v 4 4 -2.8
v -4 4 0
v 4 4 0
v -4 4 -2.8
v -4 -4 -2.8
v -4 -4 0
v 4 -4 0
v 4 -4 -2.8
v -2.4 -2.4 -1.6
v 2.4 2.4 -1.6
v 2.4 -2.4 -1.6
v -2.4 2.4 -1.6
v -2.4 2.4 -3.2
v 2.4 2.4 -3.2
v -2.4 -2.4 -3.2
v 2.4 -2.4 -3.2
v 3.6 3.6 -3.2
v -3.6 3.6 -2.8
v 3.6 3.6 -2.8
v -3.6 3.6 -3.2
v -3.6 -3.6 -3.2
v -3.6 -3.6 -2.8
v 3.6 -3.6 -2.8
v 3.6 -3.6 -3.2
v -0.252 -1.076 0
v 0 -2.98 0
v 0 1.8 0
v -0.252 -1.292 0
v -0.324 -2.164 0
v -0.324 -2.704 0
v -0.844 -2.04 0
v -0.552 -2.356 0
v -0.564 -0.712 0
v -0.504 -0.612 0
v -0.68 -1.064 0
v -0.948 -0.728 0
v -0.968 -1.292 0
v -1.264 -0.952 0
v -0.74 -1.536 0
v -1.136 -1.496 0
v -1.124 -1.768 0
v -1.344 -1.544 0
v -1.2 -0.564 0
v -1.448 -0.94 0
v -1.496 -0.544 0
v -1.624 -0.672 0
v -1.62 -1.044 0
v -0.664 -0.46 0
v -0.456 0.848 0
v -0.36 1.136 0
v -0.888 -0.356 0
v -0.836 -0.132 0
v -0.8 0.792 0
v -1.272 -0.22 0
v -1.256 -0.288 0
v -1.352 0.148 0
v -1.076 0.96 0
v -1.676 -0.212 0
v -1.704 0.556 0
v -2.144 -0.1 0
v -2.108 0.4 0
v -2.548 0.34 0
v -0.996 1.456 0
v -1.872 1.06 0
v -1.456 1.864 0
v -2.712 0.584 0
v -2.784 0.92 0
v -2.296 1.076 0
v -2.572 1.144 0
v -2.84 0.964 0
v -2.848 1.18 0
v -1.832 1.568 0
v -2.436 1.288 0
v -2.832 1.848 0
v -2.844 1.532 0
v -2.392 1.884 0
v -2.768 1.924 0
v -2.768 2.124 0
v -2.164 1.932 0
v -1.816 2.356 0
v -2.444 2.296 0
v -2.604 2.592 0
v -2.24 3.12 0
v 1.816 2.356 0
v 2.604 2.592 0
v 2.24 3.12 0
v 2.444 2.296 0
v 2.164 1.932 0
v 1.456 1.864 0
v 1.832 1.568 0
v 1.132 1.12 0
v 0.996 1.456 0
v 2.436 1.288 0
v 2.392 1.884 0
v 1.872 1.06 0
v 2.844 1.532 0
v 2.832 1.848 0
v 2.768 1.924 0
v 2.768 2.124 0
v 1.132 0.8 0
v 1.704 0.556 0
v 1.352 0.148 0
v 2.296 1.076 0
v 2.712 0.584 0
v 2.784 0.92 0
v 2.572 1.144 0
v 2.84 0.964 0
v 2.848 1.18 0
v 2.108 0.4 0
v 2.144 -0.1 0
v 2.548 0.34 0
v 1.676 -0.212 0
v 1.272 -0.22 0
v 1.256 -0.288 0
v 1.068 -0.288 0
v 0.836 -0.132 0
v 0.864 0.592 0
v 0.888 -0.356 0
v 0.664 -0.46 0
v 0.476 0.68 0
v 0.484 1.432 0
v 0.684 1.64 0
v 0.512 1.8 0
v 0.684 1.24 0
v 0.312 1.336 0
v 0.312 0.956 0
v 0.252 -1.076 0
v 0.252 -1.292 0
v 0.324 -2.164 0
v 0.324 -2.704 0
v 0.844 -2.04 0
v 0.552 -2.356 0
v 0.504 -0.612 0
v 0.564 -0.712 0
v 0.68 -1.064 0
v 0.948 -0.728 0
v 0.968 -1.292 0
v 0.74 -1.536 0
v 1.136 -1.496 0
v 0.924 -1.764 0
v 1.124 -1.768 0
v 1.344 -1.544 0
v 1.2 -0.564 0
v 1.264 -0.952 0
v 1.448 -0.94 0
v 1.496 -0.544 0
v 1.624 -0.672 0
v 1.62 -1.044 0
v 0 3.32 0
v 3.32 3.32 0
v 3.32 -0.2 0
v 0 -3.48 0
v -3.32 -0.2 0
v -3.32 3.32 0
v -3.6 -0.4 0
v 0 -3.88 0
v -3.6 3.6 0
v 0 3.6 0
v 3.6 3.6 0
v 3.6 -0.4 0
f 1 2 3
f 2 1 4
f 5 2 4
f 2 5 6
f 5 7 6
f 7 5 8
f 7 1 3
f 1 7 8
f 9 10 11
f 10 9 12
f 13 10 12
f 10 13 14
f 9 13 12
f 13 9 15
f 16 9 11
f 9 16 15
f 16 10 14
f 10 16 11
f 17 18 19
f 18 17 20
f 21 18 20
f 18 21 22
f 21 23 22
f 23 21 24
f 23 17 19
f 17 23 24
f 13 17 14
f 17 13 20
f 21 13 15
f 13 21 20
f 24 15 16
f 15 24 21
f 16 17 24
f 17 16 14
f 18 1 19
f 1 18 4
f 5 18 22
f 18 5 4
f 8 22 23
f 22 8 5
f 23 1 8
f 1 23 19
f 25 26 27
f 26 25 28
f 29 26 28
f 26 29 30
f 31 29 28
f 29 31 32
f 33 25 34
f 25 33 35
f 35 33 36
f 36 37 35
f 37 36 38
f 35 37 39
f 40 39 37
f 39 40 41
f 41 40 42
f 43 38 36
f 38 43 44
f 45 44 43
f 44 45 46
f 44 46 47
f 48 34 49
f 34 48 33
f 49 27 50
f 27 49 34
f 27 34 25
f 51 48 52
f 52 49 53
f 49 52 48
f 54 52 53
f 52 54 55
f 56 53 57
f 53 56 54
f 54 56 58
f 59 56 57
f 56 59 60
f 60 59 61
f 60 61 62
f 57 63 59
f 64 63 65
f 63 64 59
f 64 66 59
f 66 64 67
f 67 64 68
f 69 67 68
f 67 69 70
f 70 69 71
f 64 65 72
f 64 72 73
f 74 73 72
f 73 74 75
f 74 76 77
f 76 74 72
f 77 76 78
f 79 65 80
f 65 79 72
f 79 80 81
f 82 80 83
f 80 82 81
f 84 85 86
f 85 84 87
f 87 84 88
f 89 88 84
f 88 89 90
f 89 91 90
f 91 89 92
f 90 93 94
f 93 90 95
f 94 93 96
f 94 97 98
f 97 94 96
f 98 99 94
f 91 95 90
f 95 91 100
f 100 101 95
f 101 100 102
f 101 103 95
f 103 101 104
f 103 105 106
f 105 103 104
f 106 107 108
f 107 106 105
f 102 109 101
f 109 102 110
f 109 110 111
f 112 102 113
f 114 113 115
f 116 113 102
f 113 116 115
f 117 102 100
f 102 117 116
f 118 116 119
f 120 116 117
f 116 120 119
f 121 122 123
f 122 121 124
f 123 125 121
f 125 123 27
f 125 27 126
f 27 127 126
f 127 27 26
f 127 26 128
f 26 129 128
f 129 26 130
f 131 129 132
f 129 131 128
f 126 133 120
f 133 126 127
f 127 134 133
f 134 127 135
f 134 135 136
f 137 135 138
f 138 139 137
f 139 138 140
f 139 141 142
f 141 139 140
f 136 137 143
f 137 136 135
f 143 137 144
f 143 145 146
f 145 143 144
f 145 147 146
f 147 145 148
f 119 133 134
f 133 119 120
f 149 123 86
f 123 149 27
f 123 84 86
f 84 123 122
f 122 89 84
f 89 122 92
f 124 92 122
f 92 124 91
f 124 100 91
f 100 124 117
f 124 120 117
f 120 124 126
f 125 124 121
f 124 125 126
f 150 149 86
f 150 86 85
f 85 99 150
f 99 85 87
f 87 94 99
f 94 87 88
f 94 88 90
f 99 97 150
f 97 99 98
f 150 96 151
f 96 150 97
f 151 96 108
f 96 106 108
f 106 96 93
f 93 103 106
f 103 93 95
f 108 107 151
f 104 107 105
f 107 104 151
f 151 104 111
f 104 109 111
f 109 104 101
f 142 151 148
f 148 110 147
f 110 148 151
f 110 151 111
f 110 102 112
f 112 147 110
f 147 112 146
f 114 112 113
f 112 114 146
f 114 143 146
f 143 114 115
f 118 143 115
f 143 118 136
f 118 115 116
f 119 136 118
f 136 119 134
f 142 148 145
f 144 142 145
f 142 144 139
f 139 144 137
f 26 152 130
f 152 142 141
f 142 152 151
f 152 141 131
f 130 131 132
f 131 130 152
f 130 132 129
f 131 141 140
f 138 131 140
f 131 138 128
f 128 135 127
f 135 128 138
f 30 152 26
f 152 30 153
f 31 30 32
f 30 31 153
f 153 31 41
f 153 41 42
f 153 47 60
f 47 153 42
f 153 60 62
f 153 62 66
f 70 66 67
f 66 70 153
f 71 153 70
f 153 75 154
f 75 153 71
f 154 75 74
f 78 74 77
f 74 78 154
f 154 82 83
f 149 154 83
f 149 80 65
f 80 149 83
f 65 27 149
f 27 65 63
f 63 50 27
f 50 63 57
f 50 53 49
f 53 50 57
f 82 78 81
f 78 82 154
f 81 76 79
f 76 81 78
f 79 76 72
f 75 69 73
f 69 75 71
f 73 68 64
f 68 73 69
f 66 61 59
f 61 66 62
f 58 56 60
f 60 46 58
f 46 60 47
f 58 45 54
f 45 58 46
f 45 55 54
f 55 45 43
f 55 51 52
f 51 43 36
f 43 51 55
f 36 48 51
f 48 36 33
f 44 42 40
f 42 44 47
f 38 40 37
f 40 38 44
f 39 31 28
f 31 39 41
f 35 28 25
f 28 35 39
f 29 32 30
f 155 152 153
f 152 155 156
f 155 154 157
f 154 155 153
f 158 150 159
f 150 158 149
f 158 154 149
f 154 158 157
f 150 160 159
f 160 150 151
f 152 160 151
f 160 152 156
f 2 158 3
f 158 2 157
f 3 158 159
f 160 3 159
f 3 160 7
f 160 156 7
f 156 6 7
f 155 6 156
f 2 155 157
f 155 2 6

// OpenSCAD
// file: ../p/box5.scad
use <../lib.scad>
function ldraw_lib__box5() = [
// 0 Box with 5 Faces and All Edges
// 0 Name: box5.dat
// 0 Author: James Jessiman
// 0 !LDRAW_ORG Primitive UPDATE 2012-01
// 0 !LICENSE Licensed under CC BY 2.0 and CC BY 4.0 : see CAreadme.txt
// 
// 0 BFC CERTIFY CCW
  [0,"BFC","CERTIFY"],
  [0,"BFC","CCW"],
// 
// 0 !HISTORY 2002-04-03 [sbliss] Modified for BFC compliance
// 0 !HISTORY 2002-04-25 [PTadmin] Official Update 2002-02
// 0 !HISTORY 2007-06-24 [PTadmin] Header formatted for Contributor Agreement
// 0 !HISTORY 2008-07-01 [PTadmin] Official Update 2008-01
// 0 !HISTORY 2012-02-16 [Philo] Changed to CCW
// 0 !HISTORY 2012-03-30 [PTadmin] Official Update 2012-01
// 
// 
// 2 24 1 1 1 -1 1 1
  [2,24,1,1,1,-1,1,1],
// 2 24 -1 1 1 -1 1 -1
  [2,24,-1,1,1,-1,1,-1],
// 2 24 -1 1 -1 1 1 -1
  [2,24,-1,1,-1,1,1,-1],
// 2 24 1 1 -1 1 1 1
  [2,24,1,1,-1,1,1,1],
// 2 24 1 0 1 -1 0 1
  [2,24,1,0,1,-1,0,1],
// 2 24 -1 0 1 -1 0 -1
  [2,24,-1,0,1,-1,0,-1],
// 2 24 -1 0 -1 1 0 -1
  [2,24,-1,0,-1,1,0,-1],
// 2 24 1 0 -1 1 0 1
  [2,24,1,0,-1,1,0,1],
// 2 24 1 0 1 1 1 1
  [2,24,1,0,1,1,1,1],
// 2 24 -1 0 1 -1 1 1
  [2,24,-1,0,1,-1,1,1],
// 2 24 1 0 -1 1 1 -1
  [2,24,1,0,-1,1,1,-1],
// 2 24 -1 0 -1 -1 1 -1
  [2,24,-1,0,-1,-1,1,-1],
// 4 16 -1 1 1 1 1 1 1 1 -1 -1 1 -1
  [4,16,-1,1,1,1,1,1,1,1,-1,-1,1,-1],
// 4 16 -1 1 1 -1 0 1 1 0 1 1 1 1
  [4,16,-1,1,1,-1,0,1,1,0,1,1,1,1],
// 4 16 -1 1 -1 -1 0 -1 -1 0 1 -1 1 1
  [4,16,-1,1,-1,-1,0,-1,-1,0,1,-1,1,1],
// 4 16 1 1 -1 1 0 -1 -1 0 -1 -1 1 -1
  [4,16,1,1,-1,1,0,-1,-1,0,-1,-1,1,-1],
// 4 16 1 1 1 1 0 1 1 0 -1 1 1 -1
  [4,16,1,1,1,1,0,1,1,0,-1,1,1,-1],
];
makepoly(ldraw_lib__box5(), line=0.2);
// file: ../p/box4.scad
use <../lib.scad>
function ldraw_lib__box4() = [
// 0 Box with 4 Faces (2 Parallel Pairs) and All Edges
// 0 Name: box4.dat
// 0 Author: James Jessiman
// 0 !LDRAW_ORG Primitive UPDATE 2012-01
// 0 !LICENSE Licensed under CC BY 2.0 and CC BY 4.0 : see CAreadme.txt
// 
// 0 BFC CERTIFY CCW
  [0,"BFC","CERTIFY"],
  [0,"BFC","CCW"],
// 
// 0 !HISTORY 2002-04-03 [sbliss] Modified for BFC compliance
// 0 !HISTORY 2002-04-25 [PTadmin] Official Update 2002-02
// 0 !HISTORY 2007-06-24 [PTadmin] Header formatted for Contributor Agreement
// 0 !HISTORY 2008-07-01 [PTadmin] Official Update 2008-01
// 0 !HISTORY 2012-02-16 [Philo] Changed to CCW
// 0 !HISTORY 2012-03-30 [PTadmin] Official Update 2012-01
// 
// 
// 2 24 1 1 1 -1 1 1
  [2,24,1,1,1,-1,1,1],
// 2 24 -1 1 1 -1 1 -1
  [2,24,-1,1,1,-1,1,-1],
// 2 24 -1 1 -1 1 1 -1
  [2,24,-1,1,-1,1,1,-1],
// 2 24 1 1 -1 1 1 1
  [2,24,1,1,-1,1,1,1],
// 2 24 1 0 1 -1 0 1
  [2,24,1,0,1,-1,0,1],
// 2 24 -1 0 1 -1 0 -1
  [2,24,-1,0,1,-1,0,-1],
// 2 24 -1 0 -1 1 0 -1
  [2,24,-1,0,-1,1,0,-1],
// 2 24 1 0 -1 1 0 1
  [2,24,1,0,-1,1,0,1],
// 2 24 1 0 1 1 1 1
  [2,24,1,0,1,1,1,1],
// 2 24 -1 0 1 -1 1 1
  [2,24,-1,0,1,-1,1,1],
// 2 24 1 0 -1 1 1 -1
  [2,24,1,0,-1,1,1,-1],
// 2 24 -1 0 -1 -1 1 -1
  [2,24,-1,0,-1,-1,1,-1],
// 4 16 -1 1 1 -1 0 1 1 0 1 1 1 1
  [4,16,-1,1,1,-1,0,1,1,0,1,1,1,1],
// 4 16 -1 1 -1 -1 0 -1 -1 0 1 -1 1 1
  [4,16,-1,1,-1,-1,0,-1,-1,0,1,-1,1,1],
// 4 16 1 1 -1 1 0 -1 -1 0 -1 -1 1 -1
  [4,16,1,1,-1,1,0,-1,-1,0,-1,-1,1,-1],
// 4 16 1 1 1 1 0 1 1 0 -1 1 1 -1
  [4,16,1,1,1,1,0,1,1,0,-1,1,1,-1],
];
makepoly(ldraw_lib__box4(), line=0.2);
// file: s/3070bs01.scad
use <../../lib.scad>
use <../../p/box4.scad>
use <../../p/box5.scad>
function ldraw_lib__s__3070bs01() = [
// 0 ~Tile  1 x  1 with Groove without Top Face
// 0 Name: s\3070bs01.dat
// 0 Author: Chris Dee [cwdee]
// 0 !LDRAW_ORG Subpart UPDATE 2009-02
// 0 !LICENSE Licensed under CC BY 2.0 and CC BY 4.0 : see CAreadme.txt
// 
// 0 BFC CERTIFY CCW
  [0,"BFC","CERTIFY"],
  [0,"BFC","CCW"],
// 
// 0 !HISTORY 2009-09-03 [PTadmin] Official Update 2009-02
// 
// 
// 1 16 0 0 0 10 0 0 0 7 0 0 0 10 box4.dat
  [1,16,0,0,0,10,0,0,0,7,0,0,0,10, ldraw_lib__box4()],
// 0 BFC INVERTNEXT
  [0,"BFC","INVERTNEXT"],
// 1 16 0 8 0 6 0 0 0 -4 0 0 0 6 box5.dat
  [1,16,0,8,0,6,0,0,0,-4,0,0,0,6, ldraw_lib__box5()],
// 1 16 0 7 0 9 0 0 0 1 0 0 0 9 box4.dat
  [1,16,0,7,0,9,0,0,0,1,0,0,0,9, ldraw_lib__box4()],
// 
// 4 16 9 8 9 6 8 6 -6 8 6 -9 8 9
  [4,16,9,8,9,6,8,6,-6,8,6,-9,8,9],
// 4 16 -9 8 9 -6 8 6 -6 8 -6 -9 8 -9
  [4,16,-9,8,9,-6,8,6,-6,8,-6,-9,8,-9],
// 4 16 -9 8 -9 -6 8 -6 6 8 -6 9 8 -9
  [4,16,-9,8,-9,-6,8,-6,6,8,-6,9,8,-9],
// 4 16 9 8 -9 6 8 -6 6 8 6 9 8 9
  [4,16,9,8,-9,6,8,-6,6,8,6,9,8,9],
// 
// 4 16 10 7 10 9 7 9 -9 7 9 -10 7 10
  [4,16,10,7,10,9,7,9,-9,7,9,-10,7,10],
// 4 16 -10 7 10 -9 7 9 -9 7 -9 -10 7 -10
  [4,16,-10,7,10,-9,7,9,-9,7,-9,-10,7,-10],
// 4 16 -10 7 -10 -9 7 -9 9 7 -9 10 7 -10
  [4,16,-10,7,-10,-9,7,-9,9,7,-9,10,7,-10],
// 4 16 10 7 -10 9 7 -9 9 7 9 10 7 10
  [4,16,10,7,-10,9,7,-9,9,7,9,10,7,10],
// 0
];
makepoly(ldraw_lib__s__3070bs01(), line=0.2);
// file: s/3070bpe0s02.scad
use <../../lib.scad>
function ldraw_lib__s__3070bpe0s02() = [
// 0 ~Pentagonal Shield Frame
// 0 Name: s\3070bpe0s02.dat
// 0 Author: Johann Eisner [technicbasics]
// 0 !LDRAW_ORG Subpart UPDATE 2019-03
// 0 !LICENSE Licensed under CC BY 2.0 and CC BY 4.0 : see CAreadme.txt
// 
// 0 BFC CERTIFY CCW
  [0,"BFC","CERTIFY"],
  [0,"BFC","CCW"],
// 
// 0 !HISTORY 2019-12-27 [PTadmin] Official Update 2019-03
// 
// 
// 4 0 -9 0 -1 0 0 -9.7 0 0 -8.7 -8.3 0 -0.5
  [4,0,-9,0,-1,0,0,-9.7,0,0,-8.7,-8.3,0,-0.5],
// 4 0 -9 0 9 -9 0 -1 -8.3 0 -.5 -8.3 0 8.3
  [4,0,-9,0,9,-9,0,-1,-8.3,0,-.5,-8.3,0,8.3],
// 4 0 9 0 9 0 0 9 0 0 8.3 8.3 0 8.3
  [4,0,9,0,9,0,0,9,0,0,8.3,8.3,0,8.3],
// 4 0 0 0 9 -9 0 9 -8.3 0 8.3 0 0 8.3
  [4,0,0,0,9,-9,0,9,-8.3,0,8.3,0,0,8.3],
// 4 0 9 0 9 8.3 0 8.3 8.3 0 -.5 9 0 -1
  [4,0,9,0,9,8.3,0,8.3,8.3,0,-.5,9,0,-1],
// 4 0 9 0 -1 8.3 0 -0.5 0 0 -8.7 0 0 -9.7
  [4,0,9,0,-1,8.3,0,-0.5,0,0,-8.7,0,0,-9.7],
// 4 16 -10 0 10 -9 0 9 0 0 9 10 0 10
  [4,16,-10,0,10,-9,0,9,0,0,9,10,0,10],
// 3 16 10 0 10 0 0 9 9 0 9
  [3,16,10,0,10,0,0,9,9,0,9],
// 4 16 10 0 10 9 0 9 9 0 -1 10 0 -10
  [4,16,10,0,10,9,0,9,9,0,-1,10,0,-10],
// 3 16 9 0 -1 0 0 -9.7 10 0 -10
  [3,16,9,0,-1,0,0,-9.7,10,0,-10],
// 3 16 0 0 -9.7 -10 0 -10 10 0 -10
  [3,16,0,0,-9.7,-10,0,-10,10,0,-10],
// 3 16 -9 0 -1 -10 0 -10 0 0 -9.7
  [3,16,-9,0,-1,-10,0,-10,0,0,-9.7],
// 4 16 -10 0 10 -10 0 -10 -9 0 -1 -9 0 9
  [4,16,-10,0,10,-10,0,-10,-9,0,-1,-9,0,9],
];
makepoly(ldraw_lib__s__3070bpe0s02(), line=0.2);
// main file
use <../lib.scad>
use <s/3070bpe0s02.scad>
use <s/3070bpe4s01.scad>
use <s/3070bs01.scad>
function ldraw_lib__3070bpe4() = [
// 0 Tile  1 x  1 with Blue and White Falcon on Pentagonal Shield Pattern
// 0 Name: 3070bpe4.dat
// 0 Author: Vincent Messenet [Cheenzo]
// 0 !LDRAW_ORG Part UPDATE 2019-03
// 0 !LICENSE Licensed under CC BY 2.0 and CC BY 4.0 : see CAreadme.txt
// 
// 0 BFC CERTIFY CCW
  [0,"BFC","CERTIFY"],
  [0,"BFC","CCW"],
// 
// 0 !KEYWORDS BrickLink 3070bpb100, Nexo Knights
// 
// 0 !HISTORY 2019-12-27 [PTadmin] Official Update 2019-03
// 
// 
// 1 16 0 0 0 1 0 0 0 1 0 0 0 1 s\3070bs01.dat
  [1,16,0,0,0,1,0,0,0,1,0,0,0,1, ldraw_lib__s__3070bs01()],
// 1 16 0 0 0 1 0 0 0 1 0 0 0 1 s\3070bpe4s01.dat
  [1,16,0,0,0,1,0,0,0,1,0,0,0,1, ldraw_lib__s__3070bpe4s01()],
// 1 16 0 0 0 1 0 0 0 1 0 0 0 1 s\3070bpe0s02.dat
  [1,16,0,0,0,1,0,0,0,1,0,0,0,1, ldraw_lib__s__3070bpe0s02()],
];
makepoly(ldraw_lib__3070bpe4(), line=0.2);
